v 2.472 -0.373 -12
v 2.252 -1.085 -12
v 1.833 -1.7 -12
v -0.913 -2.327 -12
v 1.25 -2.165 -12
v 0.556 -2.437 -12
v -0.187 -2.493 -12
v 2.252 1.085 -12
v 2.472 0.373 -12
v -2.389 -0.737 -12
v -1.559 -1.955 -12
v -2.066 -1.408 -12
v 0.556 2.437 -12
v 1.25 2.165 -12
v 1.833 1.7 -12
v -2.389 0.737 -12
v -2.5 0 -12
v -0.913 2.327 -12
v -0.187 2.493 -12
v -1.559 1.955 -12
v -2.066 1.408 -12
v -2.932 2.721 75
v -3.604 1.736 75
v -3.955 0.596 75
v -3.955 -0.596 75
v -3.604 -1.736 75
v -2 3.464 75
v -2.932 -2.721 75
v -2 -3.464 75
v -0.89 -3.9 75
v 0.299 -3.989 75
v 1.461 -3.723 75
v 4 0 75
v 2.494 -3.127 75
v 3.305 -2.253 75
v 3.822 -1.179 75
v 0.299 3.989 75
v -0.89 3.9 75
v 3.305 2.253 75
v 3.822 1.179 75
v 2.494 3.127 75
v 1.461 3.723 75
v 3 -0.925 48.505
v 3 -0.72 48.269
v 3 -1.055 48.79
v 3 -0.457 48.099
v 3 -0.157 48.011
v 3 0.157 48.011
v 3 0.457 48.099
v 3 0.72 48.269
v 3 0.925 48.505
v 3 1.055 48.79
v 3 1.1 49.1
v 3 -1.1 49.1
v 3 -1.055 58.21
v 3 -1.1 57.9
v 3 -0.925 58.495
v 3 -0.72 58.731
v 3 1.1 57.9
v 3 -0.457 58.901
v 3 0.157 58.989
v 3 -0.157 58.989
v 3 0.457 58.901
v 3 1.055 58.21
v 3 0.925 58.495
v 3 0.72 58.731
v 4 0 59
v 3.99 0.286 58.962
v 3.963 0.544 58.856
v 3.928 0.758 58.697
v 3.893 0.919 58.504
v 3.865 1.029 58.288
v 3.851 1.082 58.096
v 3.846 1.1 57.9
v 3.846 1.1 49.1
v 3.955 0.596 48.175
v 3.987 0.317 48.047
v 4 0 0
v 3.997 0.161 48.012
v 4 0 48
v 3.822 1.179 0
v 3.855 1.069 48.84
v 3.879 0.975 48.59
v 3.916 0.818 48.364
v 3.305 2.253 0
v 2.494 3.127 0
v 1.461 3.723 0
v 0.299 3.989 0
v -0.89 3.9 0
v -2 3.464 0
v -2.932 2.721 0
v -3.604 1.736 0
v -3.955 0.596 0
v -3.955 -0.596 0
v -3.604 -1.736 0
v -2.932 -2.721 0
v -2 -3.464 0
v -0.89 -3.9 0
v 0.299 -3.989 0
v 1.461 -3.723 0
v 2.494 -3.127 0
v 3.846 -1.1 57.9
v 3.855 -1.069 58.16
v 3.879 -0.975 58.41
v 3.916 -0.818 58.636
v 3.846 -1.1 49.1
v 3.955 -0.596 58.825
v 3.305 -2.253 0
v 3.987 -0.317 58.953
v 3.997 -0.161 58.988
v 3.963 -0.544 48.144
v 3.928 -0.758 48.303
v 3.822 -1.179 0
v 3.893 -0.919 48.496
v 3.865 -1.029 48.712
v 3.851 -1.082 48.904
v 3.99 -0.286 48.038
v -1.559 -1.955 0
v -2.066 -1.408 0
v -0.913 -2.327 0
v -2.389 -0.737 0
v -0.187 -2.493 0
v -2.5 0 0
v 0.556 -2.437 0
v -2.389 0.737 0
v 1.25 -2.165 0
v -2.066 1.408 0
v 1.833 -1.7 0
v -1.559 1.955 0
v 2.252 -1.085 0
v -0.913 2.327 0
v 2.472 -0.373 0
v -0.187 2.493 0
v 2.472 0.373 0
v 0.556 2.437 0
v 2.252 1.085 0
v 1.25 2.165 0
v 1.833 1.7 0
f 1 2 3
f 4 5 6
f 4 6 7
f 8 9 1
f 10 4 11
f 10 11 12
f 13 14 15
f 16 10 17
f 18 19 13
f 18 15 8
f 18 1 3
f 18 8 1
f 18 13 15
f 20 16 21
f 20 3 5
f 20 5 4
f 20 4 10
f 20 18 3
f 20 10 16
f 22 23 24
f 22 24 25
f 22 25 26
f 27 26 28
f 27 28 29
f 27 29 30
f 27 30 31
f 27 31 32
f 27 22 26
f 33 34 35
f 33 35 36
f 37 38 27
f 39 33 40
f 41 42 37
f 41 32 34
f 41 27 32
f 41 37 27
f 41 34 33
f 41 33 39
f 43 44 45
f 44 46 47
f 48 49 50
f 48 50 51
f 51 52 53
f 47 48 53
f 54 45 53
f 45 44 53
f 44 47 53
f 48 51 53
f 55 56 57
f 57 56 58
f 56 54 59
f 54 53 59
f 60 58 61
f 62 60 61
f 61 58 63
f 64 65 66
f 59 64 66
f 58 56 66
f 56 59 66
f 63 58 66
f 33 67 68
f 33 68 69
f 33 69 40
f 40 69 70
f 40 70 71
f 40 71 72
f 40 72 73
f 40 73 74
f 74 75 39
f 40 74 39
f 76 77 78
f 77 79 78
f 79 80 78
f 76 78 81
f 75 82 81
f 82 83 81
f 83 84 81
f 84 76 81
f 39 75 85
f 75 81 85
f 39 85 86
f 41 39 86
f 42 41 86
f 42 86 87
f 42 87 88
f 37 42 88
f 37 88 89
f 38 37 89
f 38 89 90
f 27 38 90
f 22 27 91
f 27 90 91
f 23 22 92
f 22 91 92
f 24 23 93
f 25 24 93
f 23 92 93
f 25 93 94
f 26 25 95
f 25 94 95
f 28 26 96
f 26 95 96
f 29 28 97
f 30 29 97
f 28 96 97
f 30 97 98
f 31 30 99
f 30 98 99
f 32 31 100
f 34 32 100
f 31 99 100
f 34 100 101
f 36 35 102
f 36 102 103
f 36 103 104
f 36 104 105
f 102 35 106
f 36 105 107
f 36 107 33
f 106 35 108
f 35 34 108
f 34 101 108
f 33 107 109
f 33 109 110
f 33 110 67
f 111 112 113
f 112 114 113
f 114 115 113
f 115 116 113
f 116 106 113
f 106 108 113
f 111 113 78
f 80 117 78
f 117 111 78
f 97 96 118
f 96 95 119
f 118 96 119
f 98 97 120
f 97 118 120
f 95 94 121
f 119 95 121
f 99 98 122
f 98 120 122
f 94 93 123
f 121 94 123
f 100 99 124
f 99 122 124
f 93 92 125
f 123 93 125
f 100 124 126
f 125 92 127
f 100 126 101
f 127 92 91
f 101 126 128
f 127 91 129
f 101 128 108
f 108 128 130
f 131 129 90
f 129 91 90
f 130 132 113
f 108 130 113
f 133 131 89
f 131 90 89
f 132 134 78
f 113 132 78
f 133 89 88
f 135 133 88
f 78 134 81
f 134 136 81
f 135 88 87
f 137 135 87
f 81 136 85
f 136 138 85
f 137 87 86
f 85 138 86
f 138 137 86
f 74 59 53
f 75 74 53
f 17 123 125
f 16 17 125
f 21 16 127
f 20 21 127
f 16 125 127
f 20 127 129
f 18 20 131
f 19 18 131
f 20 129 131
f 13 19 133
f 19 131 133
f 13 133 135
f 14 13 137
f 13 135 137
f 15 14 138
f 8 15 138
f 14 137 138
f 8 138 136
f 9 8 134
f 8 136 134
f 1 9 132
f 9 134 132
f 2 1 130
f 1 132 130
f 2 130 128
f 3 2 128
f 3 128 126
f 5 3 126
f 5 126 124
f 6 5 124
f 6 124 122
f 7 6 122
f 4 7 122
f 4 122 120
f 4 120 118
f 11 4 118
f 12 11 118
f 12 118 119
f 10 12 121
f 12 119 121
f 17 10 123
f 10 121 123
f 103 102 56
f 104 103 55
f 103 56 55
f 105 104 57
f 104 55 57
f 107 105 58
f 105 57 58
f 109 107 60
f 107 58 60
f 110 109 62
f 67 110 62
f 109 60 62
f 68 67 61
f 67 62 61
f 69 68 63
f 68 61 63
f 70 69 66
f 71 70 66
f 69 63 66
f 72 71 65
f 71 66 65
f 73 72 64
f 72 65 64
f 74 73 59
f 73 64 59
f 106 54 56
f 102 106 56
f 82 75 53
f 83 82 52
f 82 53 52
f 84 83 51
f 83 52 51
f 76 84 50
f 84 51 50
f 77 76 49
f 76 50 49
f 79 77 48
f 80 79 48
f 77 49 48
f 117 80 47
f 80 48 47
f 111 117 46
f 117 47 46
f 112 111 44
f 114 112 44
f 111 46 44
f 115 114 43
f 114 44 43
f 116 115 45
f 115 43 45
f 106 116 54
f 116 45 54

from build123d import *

# Parameters (mm, degrees)
SKETCH_1_R          = 4
EXTRUDE_1_DEPTH     = 75
SKETCH_2_R          = 2.5
EXTRUDE_2_DEPTH     = 12
CUT_EXTRUDE_1_DEPTH = 2


with BuildPart() as part:
    # ｽｹｯﾁ1 → ﾎﾞｽ - 押し出し1 (new body)
    with BuildSketch(Plane.XY):
        Circle(SKETCH_1_R)
    extrude(amount=EXTRUDE_1_DEPTH)

    # ｽｹｯﾁ2 → ﾎﾞｽ - 押し出し2 (add)
    with BuildSketch(Plane(origin=(0, 0, 0), x_dir=(-1, 0, 0), z_dir=(0, 0, -1))):
        Circle(SKETCH_2_R)
    extrude(amount=EXTRUDE_2_DEPTH)

    # ｽｹｯﾁ3 → ｶｯﾄ - 押し出し1 (cut, through all)
    with BuildSketch(Plane(origin=(3, 0, 0), x_dir=(0, 0, -1), z_dir=(1, 0, 0))):
        with BuildLine():
            Line((-57.9, 1.1), (-49.1, 1.1))
            ThreePointArc((-49.1, 1.1), (-48, 0), (-49.1, -1.1))
            Line((-49.1, -1.1), (-57.9, -1.1))
            ThreePointArc((-57.9, -1.1), (-59, 0), (-57.9, 1.1))
        make_face()
    extrude(amount=CUT_EXTRUDE_1_DEPTH, mode=Mode.SUBTRACT)


solid = part.part
